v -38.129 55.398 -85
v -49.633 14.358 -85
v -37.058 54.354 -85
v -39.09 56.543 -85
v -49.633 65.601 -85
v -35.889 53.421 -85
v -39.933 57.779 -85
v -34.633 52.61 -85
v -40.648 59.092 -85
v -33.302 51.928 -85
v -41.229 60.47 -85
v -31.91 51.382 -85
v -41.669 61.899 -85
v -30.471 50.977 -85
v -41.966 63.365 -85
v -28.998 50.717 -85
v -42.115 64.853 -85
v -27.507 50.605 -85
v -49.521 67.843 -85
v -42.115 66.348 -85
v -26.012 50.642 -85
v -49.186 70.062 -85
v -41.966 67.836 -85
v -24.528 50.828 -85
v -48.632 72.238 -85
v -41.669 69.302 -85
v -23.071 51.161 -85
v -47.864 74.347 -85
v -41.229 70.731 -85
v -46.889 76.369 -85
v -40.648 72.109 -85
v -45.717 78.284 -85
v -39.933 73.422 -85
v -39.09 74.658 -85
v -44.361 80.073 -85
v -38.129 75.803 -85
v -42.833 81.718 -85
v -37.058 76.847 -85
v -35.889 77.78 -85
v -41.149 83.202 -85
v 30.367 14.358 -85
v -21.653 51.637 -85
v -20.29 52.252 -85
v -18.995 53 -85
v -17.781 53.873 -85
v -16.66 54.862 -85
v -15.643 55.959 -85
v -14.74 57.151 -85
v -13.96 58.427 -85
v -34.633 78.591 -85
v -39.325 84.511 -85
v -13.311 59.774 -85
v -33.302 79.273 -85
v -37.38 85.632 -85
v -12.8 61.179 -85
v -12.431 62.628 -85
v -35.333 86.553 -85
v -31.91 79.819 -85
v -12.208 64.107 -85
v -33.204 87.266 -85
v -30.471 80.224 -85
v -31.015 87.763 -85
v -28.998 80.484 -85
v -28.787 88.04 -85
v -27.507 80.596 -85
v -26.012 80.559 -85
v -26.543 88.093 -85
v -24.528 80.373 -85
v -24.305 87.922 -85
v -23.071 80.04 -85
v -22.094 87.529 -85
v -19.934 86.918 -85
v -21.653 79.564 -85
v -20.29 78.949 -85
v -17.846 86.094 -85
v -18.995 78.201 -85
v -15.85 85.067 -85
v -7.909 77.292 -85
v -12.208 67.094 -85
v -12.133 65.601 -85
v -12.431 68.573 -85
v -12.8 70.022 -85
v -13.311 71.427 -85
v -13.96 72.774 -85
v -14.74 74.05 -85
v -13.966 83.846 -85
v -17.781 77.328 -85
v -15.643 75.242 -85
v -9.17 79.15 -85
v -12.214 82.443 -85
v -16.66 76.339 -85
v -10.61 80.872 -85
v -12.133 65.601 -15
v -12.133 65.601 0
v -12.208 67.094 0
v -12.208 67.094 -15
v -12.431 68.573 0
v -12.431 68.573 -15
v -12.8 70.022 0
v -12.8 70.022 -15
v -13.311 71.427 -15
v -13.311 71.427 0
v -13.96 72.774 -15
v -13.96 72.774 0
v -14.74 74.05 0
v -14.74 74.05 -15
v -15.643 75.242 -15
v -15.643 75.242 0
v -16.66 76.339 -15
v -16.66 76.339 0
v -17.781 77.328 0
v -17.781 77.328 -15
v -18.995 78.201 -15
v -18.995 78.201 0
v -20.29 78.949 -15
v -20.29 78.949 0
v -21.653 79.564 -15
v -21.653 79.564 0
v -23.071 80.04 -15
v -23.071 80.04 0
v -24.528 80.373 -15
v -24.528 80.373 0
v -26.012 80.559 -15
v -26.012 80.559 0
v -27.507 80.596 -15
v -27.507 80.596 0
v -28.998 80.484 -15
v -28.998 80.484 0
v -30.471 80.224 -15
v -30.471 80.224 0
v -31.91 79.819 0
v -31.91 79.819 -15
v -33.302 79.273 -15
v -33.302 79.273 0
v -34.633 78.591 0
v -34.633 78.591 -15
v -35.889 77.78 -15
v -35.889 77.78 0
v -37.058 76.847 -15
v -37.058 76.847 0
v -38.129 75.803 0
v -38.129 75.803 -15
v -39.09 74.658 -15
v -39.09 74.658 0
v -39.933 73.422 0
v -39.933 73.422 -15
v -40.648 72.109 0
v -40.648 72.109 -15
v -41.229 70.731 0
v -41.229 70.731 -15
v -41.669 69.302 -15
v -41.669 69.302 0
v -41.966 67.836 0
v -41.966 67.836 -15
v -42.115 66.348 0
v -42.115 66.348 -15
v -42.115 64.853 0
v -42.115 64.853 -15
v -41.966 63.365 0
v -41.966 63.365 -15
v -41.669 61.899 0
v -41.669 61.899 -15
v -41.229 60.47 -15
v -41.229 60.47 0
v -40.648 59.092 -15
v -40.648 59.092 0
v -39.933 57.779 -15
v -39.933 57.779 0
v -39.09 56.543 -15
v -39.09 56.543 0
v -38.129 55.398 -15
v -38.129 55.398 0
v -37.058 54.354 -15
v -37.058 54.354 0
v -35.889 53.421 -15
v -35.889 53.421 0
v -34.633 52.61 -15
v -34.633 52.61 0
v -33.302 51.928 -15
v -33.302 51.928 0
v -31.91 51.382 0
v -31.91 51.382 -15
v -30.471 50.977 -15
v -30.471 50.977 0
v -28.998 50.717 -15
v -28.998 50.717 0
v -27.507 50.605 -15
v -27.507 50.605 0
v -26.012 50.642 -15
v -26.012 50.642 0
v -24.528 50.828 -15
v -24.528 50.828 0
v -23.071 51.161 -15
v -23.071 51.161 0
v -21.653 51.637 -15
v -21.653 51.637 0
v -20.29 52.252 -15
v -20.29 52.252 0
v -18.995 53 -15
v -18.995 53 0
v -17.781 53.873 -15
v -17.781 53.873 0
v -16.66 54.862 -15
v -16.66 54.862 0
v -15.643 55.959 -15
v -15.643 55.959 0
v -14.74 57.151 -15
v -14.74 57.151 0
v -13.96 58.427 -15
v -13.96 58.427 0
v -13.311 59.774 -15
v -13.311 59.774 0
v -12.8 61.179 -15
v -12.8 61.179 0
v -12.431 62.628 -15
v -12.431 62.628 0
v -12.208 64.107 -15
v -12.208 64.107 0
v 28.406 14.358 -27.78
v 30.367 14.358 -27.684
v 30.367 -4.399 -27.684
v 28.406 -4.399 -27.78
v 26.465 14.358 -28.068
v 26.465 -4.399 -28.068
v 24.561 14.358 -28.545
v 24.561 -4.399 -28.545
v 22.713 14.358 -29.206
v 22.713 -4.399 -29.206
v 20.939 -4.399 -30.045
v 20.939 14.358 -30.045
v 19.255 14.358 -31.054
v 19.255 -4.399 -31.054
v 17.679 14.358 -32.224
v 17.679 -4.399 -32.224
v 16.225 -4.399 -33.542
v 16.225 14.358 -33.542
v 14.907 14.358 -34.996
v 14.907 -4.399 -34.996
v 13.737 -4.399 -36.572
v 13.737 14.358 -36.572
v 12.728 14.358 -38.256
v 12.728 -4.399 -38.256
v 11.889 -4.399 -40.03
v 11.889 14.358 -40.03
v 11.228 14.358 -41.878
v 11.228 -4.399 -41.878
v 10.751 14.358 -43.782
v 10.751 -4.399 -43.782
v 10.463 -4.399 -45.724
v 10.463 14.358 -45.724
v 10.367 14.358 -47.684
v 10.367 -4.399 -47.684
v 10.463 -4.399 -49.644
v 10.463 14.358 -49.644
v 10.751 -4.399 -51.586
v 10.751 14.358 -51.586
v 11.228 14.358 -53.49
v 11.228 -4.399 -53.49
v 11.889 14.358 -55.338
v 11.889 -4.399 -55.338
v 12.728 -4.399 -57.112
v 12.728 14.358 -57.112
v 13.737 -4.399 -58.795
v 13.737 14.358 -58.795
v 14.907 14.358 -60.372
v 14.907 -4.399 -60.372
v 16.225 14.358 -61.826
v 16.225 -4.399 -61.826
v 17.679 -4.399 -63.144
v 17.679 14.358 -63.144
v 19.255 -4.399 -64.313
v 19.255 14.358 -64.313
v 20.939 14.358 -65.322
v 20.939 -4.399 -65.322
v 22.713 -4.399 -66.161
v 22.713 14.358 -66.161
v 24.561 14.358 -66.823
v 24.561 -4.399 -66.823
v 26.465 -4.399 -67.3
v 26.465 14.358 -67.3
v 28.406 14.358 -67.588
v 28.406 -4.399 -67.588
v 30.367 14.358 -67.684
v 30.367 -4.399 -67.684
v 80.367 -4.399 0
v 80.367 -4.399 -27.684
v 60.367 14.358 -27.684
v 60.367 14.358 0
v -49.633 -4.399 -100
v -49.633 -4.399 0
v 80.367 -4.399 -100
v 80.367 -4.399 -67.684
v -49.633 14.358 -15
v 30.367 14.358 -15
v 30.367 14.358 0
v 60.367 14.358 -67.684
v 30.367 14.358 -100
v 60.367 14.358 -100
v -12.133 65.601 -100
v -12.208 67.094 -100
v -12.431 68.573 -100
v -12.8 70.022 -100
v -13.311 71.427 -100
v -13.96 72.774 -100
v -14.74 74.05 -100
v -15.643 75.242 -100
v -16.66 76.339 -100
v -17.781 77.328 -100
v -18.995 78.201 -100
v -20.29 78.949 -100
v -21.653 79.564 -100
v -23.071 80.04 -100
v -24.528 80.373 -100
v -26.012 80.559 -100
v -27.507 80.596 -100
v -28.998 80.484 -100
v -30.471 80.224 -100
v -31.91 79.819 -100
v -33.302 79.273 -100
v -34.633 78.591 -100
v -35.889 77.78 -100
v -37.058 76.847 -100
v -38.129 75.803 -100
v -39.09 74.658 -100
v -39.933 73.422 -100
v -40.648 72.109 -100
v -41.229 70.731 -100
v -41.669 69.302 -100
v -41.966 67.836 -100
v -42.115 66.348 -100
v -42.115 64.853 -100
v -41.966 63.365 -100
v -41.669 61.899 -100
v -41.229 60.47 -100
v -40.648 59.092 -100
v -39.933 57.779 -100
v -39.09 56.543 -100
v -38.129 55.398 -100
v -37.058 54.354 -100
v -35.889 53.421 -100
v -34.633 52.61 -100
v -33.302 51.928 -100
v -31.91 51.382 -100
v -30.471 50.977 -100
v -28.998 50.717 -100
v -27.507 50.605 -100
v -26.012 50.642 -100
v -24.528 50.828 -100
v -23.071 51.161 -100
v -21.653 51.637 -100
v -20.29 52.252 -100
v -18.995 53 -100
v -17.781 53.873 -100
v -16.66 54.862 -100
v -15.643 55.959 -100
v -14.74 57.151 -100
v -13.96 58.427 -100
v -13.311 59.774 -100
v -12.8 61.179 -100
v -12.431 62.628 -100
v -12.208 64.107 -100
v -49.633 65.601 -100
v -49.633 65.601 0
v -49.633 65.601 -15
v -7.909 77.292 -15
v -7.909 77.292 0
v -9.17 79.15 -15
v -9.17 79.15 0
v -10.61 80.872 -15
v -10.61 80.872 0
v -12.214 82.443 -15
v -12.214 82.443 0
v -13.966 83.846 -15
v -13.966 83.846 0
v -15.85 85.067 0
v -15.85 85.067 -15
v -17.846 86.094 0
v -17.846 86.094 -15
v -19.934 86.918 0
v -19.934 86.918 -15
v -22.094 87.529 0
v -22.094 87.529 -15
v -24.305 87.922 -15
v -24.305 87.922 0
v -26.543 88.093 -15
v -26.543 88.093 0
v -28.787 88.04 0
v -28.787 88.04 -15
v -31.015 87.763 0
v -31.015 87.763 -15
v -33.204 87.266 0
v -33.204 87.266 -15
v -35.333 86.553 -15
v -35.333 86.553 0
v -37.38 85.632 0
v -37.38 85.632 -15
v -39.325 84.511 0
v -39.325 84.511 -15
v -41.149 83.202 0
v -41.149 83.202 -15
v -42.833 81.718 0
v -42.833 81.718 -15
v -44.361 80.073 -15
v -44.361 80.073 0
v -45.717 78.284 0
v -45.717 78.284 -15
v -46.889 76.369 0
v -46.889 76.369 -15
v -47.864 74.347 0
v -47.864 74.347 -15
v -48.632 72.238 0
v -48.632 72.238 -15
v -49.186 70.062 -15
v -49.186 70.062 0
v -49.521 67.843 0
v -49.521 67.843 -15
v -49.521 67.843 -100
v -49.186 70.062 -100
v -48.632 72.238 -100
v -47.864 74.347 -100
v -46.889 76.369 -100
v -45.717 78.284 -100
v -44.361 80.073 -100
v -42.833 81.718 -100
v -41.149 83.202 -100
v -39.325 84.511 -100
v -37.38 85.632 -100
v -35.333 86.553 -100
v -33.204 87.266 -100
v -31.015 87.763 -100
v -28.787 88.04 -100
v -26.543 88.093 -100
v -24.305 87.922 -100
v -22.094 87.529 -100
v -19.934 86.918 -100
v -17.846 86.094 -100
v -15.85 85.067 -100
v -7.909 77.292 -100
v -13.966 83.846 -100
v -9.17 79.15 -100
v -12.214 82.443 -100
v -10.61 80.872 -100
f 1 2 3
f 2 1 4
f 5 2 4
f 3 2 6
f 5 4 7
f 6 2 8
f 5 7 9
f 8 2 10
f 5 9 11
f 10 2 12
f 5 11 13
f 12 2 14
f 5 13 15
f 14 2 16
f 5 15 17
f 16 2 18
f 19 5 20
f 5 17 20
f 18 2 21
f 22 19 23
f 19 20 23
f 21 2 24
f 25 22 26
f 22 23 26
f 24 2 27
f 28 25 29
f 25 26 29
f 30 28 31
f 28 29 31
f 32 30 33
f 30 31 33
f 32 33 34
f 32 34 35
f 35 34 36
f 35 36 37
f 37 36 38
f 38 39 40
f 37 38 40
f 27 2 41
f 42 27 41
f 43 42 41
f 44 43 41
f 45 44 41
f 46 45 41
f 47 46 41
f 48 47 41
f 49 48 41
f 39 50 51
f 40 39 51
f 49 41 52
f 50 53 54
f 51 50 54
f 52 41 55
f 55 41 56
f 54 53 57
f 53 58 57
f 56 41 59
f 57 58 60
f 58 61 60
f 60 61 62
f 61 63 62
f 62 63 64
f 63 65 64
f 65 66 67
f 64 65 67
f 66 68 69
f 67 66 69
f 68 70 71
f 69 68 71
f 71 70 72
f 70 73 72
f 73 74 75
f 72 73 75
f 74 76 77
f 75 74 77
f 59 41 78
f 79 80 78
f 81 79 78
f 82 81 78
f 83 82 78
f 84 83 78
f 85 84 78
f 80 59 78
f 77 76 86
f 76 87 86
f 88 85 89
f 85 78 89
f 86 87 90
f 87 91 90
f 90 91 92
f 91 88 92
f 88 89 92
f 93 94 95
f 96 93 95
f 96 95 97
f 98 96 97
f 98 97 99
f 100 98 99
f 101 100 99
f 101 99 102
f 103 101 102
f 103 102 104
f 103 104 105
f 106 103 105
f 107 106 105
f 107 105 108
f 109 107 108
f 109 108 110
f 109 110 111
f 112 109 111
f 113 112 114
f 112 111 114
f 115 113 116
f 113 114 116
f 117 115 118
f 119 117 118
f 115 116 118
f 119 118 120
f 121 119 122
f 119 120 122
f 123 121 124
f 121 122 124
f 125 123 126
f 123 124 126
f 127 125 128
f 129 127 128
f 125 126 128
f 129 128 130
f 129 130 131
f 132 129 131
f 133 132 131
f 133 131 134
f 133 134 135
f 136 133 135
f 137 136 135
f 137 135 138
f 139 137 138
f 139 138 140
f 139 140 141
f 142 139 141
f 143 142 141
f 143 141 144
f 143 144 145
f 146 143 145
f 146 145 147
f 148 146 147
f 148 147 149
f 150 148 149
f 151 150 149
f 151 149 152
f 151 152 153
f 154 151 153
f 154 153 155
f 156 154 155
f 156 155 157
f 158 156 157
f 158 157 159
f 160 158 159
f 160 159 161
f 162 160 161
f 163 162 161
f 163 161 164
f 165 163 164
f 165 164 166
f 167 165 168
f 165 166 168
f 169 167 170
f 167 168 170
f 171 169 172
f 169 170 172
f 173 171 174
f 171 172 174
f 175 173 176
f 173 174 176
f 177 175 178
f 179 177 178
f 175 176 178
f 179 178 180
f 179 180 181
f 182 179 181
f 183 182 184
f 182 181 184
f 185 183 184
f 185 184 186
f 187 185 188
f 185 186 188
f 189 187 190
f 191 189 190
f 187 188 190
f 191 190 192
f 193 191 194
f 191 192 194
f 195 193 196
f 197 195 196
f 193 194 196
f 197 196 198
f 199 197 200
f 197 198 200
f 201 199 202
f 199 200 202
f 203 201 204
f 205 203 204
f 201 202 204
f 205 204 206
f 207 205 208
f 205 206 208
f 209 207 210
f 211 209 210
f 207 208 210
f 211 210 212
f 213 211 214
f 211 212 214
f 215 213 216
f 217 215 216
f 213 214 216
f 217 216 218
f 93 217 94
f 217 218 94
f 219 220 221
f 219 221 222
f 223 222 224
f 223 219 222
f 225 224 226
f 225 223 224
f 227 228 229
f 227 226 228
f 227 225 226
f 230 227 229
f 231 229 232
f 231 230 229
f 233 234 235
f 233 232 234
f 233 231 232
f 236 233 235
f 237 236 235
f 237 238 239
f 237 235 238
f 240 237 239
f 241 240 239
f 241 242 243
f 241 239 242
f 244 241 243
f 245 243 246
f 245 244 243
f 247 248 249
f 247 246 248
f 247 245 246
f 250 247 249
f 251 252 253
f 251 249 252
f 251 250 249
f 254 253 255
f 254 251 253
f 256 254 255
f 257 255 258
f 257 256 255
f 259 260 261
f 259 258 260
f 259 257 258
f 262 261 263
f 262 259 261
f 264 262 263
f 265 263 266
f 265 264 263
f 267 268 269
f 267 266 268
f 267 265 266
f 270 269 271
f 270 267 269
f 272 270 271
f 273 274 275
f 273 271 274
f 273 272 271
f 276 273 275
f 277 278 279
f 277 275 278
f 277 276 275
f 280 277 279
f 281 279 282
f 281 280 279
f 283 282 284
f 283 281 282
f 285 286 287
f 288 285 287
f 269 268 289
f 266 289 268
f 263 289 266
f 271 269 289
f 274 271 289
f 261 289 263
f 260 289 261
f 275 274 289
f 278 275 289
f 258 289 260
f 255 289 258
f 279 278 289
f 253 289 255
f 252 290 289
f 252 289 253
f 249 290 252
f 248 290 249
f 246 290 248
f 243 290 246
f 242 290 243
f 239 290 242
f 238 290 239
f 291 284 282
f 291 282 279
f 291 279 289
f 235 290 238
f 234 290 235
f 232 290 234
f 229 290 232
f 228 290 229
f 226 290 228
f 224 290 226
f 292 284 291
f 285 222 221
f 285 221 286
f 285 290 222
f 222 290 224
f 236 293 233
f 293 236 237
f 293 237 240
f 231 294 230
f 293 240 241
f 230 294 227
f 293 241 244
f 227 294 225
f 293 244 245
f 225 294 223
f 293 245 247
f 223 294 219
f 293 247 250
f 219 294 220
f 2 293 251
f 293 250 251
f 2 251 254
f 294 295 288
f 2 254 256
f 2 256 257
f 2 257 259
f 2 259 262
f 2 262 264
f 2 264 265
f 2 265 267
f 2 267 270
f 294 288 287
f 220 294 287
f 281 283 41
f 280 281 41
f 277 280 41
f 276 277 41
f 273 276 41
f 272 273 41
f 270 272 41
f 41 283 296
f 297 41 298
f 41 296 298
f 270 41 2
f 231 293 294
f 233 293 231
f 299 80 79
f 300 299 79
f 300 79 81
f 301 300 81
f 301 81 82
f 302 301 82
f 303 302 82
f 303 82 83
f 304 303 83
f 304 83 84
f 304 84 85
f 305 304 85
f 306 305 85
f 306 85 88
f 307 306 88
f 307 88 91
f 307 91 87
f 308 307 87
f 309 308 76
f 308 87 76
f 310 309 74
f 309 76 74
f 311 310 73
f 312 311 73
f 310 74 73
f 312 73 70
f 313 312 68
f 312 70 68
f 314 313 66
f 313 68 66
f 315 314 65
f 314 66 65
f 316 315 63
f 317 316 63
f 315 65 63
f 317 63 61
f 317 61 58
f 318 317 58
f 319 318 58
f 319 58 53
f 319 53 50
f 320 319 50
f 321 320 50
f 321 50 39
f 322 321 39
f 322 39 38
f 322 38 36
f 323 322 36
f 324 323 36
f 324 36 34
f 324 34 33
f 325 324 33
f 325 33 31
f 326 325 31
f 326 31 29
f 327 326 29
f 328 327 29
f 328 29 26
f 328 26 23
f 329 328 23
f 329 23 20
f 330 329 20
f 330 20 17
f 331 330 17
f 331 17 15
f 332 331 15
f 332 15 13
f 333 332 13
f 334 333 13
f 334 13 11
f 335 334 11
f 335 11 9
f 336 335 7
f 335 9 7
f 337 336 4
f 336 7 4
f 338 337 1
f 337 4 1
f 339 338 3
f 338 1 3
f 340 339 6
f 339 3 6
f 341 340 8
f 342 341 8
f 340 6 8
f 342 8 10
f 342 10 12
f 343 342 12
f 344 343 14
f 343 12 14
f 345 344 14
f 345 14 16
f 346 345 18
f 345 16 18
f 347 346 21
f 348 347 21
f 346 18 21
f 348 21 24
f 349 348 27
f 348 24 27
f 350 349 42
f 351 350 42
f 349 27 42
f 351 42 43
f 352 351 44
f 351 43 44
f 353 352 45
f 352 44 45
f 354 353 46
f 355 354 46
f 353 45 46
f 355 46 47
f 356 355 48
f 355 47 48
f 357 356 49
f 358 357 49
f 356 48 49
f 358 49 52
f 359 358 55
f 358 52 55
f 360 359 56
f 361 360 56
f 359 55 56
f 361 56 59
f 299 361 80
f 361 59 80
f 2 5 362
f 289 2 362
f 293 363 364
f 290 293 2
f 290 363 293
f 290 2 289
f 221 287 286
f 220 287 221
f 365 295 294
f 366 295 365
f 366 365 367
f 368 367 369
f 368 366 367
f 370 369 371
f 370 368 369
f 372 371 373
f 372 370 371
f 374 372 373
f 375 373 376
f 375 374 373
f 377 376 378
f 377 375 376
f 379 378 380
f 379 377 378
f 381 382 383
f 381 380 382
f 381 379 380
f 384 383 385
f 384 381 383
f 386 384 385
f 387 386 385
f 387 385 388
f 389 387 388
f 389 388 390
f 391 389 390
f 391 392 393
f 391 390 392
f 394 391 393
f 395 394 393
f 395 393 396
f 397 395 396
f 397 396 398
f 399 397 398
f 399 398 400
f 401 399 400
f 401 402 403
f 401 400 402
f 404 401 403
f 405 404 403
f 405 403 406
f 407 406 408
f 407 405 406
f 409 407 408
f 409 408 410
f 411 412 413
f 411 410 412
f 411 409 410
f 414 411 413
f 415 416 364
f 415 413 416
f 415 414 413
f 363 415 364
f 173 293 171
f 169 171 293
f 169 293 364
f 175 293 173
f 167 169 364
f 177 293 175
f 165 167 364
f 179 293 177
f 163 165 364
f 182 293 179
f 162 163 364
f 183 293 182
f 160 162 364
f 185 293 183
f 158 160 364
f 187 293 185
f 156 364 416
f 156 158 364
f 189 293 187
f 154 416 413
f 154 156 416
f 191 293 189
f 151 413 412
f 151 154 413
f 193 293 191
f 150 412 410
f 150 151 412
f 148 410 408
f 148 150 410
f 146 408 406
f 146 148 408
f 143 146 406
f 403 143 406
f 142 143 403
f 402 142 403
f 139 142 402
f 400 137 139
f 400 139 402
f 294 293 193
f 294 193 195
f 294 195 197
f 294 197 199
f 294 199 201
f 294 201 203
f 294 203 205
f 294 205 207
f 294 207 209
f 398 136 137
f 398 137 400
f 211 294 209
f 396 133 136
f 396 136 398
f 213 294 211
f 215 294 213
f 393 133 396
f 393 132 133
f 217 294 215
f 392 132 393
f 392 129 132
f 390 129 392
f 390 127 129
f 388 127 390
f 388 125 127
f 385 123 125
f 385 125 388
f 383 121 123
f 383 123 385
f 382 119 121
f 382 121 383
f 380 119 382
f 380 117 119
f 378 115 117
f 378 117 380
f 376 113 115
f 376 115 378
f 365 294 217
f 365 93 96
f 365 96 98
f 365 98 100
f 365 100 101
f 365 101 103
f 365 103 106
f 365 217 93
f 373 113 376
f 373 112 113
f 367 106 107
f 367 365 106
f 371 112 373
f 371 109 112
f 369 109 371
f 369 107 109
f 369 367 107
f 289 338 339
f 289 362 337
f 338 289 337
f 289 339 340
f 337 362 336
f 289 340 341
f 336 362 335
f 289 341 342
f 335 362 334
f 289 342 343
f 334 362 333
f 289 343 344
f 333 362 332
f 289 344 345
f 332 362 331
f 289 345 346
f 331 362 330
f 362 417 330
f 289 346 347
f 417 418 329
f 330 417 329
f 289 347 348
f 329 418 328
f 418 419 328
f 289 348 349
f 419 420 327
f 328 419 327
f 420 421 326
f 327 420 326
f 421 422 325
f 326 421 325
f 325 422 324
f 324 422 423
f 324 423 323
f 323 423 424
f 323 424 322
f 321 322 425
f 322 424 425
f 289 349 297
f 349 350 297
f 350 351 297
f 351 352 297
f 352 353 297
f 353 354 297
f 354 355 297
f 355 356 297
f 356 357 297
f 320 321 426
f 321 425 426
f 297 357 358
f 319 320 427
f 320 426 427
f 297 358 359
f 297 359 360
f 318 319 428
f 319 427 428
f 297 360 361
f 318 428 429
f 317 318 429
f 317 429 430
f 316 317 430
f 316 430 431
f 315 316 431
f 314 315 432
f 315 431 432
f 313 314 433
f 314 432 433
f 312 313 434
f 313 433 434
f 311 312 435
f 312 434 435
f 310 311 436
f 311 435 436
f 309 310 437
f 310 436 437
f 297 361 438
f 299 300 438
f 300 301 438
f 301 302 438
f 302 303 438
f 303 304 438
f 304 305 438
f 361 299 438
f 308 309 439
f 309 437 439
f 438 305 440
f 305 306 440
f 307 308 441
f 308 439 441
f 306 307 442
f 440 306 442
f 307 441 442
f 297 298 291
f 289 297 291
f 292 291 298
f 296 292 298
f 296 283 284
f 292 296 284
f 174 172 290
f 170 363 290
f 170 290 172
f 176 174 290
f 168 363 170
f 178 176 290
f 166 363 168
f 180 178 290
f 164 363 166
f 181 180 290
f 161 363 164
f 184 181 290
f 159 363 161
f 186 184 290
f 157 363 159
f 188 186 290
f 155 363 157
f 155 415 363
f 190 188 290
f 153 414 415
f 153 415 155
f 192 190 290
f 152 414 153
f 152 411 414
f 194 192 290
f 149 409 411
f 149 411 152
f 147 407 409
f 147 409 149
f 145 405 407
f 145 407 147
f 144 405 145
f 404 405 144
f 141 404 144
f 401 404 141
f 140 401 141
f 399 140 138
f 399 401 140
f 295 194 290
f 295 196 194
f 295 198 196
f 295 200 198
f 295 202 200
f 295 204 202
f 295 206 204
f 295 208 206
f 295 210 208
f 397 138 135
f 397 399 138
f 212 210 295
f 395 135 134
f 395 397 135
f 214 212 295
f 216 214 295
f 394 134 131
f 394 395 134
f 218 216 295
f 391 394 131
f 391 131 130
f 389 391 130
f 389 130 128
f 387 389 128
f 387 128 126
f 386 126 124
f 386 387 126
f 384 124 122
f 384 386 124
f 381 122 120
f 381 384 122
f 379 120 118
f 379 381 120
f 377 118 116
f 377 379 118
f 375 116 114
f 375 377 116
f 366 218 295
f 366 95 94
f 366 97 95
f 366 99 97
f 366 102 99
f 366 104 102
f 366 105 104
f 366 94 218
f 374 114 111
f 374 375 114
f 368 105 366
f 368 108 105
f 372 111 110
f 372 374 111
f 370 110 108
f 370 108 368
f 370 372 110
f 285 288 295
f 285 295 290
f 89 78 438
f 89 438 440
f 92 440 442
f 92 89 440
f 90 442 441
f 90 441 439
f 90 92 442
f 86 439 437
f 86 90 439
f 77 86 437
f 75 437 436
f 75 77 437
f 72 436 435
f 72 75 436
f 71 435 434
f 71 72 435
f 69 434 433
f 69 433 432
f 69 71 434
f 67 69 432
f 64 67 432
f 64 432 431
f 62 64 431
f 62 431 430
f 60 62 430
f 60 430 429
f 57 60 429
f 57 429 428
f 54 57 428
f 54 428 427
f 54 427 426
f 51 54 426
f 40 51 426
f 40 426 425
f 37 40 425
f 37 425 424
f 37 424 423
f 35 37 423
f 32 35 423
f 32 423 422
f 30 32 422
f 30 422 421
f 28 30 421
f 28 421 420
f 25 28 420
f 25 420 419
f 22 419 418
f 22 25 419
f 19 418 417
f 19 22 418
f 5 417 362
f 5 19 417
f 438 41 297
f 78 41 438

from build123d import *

# Parameters (mm, degrees)
SKETCH1_R           = 15
BOSS_EXTRUDE1_DEPTH = 100
SKETCH3_W           = 70
SKETCH3_H           = 73.742288546
CUT_EXTRUDE1_DEPTH  = 50
CUT_EXTRUDE2_DEPTH  = 20


with BuildPart() as part:
    # Sketch1 → Boss-Extrude1 (new body)
    with BuildSketch(Plane.XY):
        with BuildLine():
            Line((-49.633171283, 65.600501081), (-49.633171283, -4.399498919))
            Line((-49.633171283, -4.399498919), (80.366828717, -4.399498919))
            Line((80.366828717, -4.399498919), (60.366828717, 14.358212535))
            Line((60.366828717, 14.358212535), (30.366828717, 14.358212535))
            Line((30.366828717, 14.358212535), (-7.909440204, 77.292300062))
            ThreePointArc((-7.909440204, 77.292300062), (-33.204252353, 87.265956872), (-49.633171283, 65.600501081))
        make_face()
        with Locations((-27.133171283, 65.600501081)):
            Circle(SKETCH1_R, mode=Mode.SUBTRACT)
    extrude(amount=-BOSS_EXTRUDE1_DEPTH)

    # Sketch3 → Cut-Extrude1 (cut, symmetric)
    with BuildSketch(Plane(origin=(0, 0, 0), x_dir=(0, 0, -1), z_dir=(1, 0, 0))):
        with Locations((50, 51.229356808)):
            Rectangle(SKETCH3_W, SKETCH3_H)
    extrude(amount=CUT_EXTRUDE1_DEPTH, both=True, mode=Mode.SUBTRACT)

    # Sketch4 → Cut-Extrude2 (cut, symmetric)
    with BuildSketch(Plane(origin=(0, 14.358212535, 0), x_dir=(1, 0, 0), z_dir=(0, 1, 0))):
        with BuildLine():
            Line((30.366828717, 67.683852826), (82.708182872, 67.683852826))
            Line((82.708182872, 67.683852826), (82.708182872, 27.683852826))
            Line((82.708182872, 27.683852826), (30.366828717, 27.683852826))
            ThreePointArc((30.366828717, 27.683852826), (10.366828717, 47.683852826), (30.366828717, 67.683852826))
        make_face()
    extrude(amount=CUT_EXTRUDE2_DEPTH, both=True, mode=Mode.SUBTRACT)


solid = part.part
